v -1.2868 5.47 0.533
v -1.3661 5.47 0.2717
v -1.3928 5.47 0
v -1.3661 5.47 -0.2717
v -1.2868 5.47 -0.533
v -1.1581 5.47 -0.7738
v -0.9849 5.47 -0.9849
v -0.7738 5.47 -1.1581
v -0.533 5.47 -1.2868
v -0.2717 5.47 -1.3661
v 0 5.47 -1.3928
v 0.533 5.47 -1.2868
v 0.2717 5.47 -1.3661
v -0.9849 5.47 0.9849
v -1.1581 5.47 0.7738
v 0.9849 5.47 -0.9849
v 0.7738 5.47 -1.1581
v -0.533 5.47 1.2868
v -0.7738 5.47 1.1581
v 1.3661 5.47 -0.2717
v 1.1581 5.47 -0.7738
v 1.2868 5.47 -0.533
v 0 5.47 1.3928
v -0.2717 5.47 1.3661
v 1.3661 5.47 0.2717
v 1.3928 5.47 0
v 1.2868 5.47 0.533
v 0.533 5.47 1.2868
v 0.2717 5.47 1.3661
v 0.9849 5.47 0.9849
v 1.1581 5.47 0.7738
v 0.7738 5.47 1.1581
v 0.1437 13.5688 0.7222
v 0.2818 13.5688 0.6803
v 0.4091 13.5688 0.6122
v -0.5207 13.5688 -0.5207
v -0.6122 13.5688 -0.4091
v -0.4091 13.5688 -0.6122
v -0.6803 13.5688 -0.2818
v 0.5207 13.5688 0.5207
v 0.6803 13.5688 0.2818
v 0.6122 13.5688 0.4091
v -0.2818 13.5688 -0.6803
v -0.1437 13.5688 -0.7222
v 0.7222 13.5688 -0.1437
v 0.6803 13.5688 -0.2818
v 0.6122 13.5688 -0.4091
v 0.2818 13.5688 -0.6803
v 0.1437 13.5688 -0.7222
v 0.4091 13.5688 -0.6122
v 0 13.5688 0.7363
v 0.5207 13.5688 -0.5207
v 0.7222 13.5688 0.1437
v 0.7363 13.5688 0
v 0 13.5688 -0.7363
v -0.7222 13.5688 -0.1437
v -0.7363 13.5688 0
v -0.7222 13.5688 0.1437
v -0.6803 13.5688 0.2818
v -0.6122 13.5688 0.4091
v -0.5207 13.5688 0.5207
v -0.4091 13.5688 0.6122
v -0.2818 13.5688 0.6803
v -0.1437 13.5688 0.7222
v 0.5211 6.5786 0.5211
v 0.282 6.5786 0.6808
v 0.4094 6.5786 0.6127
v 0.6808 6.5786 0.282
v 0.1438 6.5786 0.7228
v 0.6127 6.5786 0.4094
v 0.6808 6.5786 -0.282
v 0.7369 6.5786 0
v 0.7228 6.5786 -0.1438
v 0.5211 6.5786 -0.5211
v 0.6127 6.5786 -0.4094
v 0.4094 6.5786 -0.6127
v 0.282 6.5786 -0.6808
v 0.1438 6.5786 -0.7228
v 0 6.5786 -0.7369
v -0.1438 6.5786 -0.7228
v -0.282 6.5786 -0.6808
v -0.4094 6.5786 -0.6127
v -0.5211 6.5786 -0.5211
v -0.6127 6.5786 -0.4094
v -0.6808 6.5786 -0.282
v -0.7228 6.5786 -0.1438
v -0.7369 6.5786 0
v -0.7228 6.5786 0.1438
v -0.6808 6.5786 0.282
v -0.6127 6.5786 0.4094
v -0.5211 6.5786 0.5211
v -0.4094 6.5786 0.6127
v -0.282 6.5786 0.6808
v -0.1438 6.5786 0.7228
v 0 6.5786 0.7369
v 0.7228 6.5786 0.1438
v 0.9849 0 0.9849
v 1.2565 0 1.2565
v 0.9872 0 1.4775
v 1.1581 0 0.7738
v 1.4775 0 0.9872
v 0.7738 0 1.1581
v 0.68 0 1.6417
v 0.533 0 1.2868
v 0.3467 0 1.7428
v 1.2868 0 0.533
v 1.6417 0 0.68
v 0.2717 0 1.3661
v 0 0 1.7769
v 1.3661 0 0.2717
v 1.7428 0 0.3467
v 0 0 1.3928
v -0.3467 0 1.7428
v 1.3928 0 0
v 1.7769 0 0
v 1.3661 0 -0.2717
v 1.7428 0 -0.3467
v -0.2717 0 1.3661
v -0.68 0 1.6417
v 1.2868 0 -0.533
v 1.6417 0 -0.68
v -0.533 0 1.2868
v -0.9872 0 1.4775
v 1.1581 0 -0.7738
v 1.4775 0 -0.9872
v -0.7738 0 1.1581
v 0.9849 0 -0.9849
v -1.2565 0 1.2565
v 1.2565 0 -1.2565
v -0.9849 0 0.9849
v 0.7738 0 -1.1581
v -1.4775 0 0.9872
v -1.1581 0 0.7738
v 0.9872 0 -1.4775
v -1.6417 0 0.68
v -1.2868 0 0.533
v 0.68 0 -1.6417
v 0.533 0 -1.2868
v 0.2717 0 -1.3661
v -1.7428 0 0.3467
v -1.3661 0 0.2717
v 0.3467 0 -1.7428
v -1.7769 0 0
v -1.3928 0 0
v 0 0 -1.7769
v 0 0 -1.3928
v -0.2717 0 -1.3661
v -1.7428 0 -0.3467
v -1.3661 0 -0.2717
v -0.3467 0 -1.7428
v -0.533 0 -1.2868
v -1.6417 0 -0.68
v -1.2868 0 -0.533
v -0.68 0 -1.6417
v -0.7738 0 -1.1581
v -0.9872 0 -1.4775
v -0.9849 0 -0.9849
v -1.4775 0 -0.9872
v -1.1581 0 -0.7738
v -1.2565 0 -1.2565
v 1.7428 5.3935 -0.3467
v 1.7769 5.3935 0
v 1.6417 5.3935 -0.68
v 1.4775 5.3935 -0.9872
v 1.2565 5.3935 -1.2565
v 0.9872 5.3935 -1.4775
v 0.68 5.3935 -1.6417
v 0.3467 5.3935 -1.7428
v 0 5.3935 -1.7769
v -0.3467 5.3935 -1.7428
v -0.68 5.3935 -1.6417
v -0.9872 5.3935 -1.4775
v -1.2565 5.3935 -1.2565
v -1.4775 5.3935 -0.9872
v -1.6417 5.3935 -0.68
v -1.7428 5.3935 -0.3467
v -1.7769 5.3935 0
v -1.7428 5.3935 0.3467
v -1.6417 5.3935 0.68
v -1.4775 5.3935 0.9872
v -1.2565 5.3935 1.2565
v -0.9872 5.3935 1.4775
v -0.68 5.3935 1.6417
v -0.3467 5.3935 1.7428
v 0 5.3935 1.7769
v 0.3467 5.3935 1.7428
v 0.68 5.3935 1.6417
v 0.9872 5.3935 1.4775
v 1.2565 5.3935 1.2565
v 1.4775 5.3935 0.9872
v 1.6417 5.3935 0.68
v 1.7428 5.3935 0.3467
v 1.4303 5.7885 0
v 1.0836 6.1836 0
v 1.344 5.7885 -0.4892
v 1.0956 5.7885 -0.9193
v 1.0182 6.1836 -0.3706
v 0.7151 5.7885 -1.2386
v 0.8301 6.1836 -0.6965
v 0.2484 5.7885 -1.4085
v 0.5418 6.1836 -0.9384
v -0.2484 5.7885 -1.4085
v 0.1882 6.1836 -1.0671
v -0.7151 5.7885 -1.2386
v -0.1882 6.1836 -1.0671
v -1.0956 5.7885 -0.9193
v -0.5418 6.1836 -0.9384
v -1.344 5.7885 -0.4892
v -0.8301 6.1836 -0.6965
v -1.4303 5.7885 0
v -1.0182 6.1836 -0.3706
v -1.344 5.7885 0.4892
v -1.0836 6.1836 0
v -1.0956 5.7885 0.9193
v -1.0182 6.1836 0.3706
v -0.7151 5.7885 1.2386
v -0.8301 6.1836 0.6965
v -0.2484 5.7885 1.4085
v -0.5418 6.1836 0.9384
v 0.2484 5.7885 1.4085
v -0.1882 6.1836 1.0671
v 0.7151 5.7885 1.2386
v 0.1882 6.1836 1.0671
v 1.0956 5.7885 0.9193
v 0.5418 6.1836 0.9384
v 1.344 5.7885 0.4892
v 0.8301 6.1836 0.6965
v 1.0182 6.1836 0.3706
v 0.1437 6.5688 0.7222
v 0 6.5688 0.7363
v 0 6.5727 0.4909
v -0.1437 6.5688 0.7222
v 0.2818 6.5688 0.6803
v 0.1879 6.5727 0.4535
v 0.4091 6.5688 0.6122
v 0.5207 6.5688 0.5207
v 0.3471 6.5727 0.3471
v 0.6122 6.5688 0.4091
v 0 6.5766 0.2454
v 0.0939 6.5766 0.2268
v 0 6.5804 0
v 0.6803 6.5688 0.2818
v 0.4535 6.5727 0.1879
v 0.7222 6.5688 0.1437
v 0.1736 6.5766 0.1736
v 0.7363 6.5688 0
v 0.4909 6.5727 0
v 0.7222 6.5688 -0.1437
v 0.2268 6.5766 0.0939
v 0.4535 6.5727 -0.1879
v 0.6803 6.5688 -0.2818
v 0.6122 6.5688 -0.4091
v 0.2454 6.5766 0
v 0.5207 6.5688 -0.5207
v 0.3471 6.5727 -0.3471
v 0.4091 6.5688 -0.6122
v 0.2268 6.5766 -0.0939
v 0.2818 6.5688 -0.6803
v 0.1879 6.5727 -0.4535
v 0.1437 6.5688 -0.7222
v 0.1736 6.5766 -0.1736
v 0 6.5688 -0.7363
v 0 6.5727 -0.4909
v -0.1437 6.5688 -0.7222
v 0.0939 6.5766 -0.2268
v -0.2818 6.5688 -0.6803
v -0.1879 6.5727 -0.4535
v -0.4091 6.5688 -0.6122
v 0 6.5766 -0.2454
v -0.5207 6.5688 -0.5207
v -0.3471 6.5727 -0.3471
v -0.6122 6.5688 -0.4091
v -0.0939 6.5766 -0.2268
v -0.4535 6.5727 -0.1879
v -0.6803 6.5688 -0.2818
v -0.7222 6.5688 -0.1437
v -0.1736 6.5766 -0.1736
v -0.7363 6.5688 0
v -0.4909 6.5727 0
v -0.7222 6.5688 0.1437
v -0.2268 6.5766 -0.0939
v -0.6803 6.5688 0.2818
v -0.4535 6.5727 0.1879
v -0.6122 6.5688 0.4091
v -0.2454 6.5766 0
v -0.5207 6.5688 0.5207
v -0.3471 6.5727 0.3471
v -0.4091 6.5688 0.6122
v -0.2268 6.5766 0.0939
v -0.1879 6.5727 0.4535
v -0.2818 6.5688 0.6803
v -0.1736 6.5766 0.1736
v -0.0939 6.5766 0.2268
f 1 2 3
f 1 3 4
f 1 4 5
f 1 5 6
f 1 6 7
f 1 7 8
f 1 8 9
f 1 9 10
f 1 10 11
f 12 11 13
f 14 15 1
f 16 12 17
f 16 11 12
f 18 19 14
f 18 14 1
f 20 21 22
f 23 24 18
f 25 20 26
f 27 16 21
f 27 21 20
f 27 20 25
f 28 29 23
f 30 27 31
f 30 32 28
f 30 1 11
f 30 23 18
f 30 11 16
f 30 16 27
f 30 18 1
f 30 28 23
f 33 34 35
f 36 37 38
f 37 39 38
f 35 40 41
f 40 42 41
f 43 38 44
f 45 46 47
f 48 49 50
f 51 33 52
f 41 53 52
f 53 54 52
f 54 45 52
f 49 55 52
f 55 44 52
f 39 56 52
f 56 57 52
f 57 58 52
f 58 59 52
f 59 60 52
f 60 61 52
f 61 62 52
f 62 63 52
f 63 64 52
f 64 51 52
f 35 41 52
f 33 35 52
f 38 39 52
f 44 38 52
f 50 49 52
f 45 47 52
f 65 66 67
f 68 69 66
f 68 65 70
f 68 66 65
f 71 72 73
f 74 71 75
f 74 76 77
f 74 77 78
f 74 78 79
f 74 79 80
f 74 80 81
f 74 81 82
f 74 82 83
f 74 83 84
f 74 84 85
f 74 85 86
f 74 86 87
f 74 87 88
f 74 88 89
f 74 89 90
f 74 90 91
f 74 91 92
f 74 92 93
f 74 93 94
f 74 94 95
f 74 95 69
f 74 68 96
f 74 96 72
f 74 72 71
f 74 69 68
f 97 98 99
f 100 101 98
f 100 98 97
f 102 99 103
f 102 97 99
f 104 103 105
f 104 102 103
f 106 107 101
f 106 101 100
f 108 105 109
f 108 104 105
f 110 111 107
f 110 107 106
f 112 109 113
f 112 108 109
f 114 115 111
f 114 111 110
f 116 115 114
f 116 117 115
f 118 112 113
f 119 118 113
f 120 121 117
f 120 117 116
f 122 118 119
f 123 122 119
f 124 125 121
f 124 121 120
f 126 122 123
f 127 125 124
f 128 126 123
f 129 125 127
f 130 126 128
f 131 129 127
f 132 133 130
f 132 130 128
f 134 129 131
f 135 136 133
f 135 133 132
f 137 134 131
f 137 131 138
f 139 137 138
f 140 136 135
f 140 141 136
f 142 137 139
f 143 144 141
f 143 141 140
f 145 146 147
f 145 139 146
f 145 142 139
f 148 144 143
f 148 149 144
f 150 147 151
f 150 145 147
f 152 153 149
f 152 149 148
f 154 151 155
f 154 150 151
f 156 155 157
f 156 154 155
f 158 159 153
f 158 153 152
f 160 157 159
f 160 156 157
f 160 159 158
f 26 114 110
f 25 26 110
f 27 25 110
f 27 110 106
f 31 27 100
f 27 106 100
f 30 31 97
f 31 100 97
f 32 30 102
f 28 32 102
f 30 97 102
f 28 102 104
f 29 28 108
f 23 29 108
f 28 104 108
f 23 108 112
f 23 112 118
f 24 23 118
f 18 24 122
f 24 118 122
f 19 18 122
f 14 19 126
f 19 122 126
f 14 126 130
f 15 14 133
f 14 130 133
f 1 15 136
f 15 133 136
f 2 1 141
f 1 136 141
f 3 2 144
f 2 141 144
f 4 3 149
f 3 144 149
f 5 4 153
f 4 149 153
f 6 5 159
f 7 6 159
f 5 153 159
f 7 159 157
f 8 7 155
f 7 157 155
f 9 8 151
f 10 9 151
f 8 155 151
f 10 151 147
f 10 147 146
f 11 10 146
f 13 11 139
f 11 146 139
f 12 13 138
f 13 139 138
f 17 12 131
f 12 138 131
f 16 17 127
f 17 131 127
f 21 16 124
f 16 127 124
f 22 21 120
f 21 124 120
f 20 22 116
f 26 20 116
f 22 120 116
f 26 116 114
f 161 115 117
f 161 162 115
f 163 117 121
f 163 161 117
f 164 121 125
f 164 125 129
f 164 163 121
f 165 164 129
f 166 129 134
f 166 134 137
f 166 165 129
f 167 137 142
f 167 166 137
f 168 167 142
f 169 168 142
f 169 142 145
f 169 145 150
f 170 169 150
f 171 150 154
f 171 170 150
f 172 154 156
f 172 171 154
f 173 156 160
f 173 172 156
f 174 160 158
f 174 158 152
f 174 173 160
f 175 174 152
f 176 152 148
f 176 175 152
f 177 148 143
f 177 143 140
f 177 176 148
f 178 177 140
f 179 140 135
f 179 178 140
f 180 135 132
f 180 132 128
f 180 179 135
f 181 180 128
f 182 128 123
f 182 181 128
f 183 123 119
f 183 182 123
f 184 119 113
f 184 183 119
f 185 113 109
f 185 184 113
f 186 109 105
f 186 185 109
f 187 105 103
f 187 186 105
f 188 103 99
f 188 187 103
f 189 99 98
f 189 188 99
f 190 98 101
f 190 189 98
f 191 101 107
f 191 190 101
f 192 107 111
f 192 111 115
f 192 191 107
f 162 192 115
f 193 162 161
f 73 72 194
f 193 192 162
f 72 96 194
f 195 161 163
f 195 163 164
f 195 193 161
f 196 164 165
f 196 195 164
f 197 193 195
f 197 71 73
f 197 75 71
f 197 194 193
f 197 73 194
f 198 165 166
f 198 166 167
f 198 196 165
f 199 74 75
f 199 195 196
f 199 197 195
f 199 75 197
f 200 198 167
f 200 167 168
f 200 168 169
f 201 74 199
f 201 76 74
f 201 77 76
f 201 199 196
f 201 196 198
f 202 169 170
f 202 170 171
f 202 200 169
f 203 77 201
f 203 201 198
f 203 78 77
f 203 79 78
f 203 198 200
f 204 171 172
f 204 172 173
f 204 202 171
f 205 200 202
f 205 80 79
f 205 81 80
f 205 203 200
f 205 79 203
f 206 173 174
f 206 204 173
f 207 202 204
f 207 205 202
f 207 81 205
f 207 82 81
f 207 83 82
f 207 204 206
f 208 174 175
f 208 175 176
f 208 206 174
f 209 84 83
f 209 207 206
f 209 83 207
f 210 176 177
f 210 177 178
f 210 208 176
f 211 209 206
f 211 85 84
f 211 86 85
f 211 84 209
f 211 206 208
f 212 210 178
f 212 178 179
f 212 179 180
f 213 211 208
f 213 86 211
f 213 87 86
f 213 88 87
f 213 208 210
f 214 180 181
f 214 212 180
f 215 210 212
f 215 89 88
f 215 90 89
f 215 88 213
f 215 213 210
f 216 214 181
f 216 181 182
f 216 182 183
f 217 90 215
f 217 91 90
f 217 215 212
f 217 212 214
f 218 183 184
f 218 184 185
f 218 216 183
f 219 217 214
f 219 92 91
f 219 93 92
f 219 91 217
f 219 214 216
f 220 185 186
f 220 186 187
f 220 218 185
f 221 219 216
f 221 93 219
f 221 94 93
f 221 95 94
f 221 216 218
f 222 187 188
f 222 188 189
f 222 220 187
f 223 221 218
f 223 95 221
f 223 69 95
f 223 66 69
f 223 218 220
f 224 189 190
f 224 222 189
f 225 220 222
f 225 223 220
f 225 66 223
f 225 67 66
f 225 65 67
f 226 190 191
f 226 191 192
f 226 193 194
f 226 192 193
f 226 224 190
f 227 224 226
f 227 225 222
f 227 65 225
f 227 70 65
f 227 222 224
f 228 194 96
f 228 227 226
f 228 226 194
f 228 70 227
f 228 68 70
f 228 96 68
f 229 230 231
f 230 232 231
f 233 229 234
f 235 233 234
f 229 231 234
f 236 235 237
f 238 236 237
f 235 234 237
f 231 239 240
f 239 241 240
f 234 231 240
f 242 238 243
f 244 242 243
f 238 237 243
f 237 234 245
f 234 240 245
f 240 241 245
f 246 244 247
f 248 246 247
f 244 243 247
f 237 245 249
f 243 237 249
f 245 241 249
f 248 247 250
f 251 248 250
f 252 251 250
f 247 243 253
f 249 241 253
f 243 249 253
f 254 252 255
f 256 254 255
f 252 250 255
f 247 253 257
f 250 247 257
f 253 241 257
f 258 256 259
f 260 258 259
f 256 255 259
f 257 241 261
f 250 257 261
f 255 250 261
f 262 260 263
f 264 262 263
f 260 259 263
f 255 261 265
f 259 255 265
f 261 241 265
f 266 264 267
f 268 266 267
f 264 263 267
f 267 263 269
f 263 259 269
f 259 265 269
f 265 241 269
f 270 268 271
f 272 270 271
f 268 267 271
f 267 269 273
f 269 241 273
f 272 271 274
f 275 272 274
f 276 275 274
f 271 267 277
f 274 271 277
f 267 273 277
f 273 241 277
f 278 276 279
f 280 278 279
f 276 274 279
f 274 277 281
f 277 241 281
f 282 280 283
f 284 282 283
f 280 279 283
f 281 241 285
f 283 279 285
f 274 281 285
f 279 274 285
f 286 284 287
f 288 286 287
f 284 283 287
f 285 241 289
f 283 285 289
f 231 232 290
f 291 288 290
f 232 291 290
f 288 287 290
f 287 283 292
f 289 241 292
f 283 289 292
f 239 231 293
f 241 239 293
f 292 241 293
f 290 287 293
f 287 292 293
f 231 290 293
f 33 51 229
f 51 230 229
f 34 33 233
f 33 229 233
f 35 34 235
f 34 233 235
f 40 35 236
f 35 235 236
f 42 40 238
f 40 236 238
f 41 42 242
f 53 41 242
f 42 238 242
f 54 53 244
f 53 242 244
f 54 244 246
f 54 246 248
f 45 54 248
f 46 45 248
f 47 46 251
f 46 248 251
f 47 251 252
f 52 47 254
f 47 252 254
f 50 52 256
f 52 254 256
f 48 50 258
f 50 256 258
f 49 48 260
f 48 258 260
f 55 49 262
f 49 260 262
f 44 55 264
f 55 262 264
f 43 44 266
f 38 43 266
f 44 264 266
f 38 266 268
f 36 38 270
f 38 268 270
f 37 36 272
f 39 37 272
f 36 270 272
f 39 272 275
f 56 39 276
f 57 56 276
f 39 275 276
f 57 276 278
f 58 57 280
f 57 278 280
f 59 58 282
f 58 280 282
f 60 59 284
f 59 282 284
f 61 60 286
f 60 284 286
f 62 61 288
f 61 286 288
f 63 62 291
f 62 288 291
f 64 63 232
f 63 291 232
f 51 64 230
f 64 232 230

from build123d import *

# Parameters (mm, degrees)
F4_R     = 1.392824
F5_DEPTH = 5.47


with BuildPart() as f1:
    # F0 (on Top) → F1 (revolve)
    with BuildSketch(Plane.XY):
        Polygon((0, 6.578624), (0, 0), (1.776921, 0), (1.776921, 5.393505), (0.736918, 6.578624), align=None)
    revolve(axis=Axis((0, 3.289312, 0), (0, 1, 0)))

    # F4 (on face) → F5 (cut)
    with BuildSketch(Plane.XZ):
        Circle(F4_R)
    extrude(amount=-F5_DEPTH, mode=Mode.SUBTRACT)


with BuildPart() as f3:
    # F2 (on Right) → F3 (revolve)
    with BuildSketch(Plane.YZ):
        Polygon((6.568849, 0.736331), (6.580418, 0), (13.568849, 0), (13.568849, 0.736331), align=None)
    revolve(axis=Axis((0, 10.074633, 0), (0, 1, 0)))


solid = Compound([f1.part, f3.part])
